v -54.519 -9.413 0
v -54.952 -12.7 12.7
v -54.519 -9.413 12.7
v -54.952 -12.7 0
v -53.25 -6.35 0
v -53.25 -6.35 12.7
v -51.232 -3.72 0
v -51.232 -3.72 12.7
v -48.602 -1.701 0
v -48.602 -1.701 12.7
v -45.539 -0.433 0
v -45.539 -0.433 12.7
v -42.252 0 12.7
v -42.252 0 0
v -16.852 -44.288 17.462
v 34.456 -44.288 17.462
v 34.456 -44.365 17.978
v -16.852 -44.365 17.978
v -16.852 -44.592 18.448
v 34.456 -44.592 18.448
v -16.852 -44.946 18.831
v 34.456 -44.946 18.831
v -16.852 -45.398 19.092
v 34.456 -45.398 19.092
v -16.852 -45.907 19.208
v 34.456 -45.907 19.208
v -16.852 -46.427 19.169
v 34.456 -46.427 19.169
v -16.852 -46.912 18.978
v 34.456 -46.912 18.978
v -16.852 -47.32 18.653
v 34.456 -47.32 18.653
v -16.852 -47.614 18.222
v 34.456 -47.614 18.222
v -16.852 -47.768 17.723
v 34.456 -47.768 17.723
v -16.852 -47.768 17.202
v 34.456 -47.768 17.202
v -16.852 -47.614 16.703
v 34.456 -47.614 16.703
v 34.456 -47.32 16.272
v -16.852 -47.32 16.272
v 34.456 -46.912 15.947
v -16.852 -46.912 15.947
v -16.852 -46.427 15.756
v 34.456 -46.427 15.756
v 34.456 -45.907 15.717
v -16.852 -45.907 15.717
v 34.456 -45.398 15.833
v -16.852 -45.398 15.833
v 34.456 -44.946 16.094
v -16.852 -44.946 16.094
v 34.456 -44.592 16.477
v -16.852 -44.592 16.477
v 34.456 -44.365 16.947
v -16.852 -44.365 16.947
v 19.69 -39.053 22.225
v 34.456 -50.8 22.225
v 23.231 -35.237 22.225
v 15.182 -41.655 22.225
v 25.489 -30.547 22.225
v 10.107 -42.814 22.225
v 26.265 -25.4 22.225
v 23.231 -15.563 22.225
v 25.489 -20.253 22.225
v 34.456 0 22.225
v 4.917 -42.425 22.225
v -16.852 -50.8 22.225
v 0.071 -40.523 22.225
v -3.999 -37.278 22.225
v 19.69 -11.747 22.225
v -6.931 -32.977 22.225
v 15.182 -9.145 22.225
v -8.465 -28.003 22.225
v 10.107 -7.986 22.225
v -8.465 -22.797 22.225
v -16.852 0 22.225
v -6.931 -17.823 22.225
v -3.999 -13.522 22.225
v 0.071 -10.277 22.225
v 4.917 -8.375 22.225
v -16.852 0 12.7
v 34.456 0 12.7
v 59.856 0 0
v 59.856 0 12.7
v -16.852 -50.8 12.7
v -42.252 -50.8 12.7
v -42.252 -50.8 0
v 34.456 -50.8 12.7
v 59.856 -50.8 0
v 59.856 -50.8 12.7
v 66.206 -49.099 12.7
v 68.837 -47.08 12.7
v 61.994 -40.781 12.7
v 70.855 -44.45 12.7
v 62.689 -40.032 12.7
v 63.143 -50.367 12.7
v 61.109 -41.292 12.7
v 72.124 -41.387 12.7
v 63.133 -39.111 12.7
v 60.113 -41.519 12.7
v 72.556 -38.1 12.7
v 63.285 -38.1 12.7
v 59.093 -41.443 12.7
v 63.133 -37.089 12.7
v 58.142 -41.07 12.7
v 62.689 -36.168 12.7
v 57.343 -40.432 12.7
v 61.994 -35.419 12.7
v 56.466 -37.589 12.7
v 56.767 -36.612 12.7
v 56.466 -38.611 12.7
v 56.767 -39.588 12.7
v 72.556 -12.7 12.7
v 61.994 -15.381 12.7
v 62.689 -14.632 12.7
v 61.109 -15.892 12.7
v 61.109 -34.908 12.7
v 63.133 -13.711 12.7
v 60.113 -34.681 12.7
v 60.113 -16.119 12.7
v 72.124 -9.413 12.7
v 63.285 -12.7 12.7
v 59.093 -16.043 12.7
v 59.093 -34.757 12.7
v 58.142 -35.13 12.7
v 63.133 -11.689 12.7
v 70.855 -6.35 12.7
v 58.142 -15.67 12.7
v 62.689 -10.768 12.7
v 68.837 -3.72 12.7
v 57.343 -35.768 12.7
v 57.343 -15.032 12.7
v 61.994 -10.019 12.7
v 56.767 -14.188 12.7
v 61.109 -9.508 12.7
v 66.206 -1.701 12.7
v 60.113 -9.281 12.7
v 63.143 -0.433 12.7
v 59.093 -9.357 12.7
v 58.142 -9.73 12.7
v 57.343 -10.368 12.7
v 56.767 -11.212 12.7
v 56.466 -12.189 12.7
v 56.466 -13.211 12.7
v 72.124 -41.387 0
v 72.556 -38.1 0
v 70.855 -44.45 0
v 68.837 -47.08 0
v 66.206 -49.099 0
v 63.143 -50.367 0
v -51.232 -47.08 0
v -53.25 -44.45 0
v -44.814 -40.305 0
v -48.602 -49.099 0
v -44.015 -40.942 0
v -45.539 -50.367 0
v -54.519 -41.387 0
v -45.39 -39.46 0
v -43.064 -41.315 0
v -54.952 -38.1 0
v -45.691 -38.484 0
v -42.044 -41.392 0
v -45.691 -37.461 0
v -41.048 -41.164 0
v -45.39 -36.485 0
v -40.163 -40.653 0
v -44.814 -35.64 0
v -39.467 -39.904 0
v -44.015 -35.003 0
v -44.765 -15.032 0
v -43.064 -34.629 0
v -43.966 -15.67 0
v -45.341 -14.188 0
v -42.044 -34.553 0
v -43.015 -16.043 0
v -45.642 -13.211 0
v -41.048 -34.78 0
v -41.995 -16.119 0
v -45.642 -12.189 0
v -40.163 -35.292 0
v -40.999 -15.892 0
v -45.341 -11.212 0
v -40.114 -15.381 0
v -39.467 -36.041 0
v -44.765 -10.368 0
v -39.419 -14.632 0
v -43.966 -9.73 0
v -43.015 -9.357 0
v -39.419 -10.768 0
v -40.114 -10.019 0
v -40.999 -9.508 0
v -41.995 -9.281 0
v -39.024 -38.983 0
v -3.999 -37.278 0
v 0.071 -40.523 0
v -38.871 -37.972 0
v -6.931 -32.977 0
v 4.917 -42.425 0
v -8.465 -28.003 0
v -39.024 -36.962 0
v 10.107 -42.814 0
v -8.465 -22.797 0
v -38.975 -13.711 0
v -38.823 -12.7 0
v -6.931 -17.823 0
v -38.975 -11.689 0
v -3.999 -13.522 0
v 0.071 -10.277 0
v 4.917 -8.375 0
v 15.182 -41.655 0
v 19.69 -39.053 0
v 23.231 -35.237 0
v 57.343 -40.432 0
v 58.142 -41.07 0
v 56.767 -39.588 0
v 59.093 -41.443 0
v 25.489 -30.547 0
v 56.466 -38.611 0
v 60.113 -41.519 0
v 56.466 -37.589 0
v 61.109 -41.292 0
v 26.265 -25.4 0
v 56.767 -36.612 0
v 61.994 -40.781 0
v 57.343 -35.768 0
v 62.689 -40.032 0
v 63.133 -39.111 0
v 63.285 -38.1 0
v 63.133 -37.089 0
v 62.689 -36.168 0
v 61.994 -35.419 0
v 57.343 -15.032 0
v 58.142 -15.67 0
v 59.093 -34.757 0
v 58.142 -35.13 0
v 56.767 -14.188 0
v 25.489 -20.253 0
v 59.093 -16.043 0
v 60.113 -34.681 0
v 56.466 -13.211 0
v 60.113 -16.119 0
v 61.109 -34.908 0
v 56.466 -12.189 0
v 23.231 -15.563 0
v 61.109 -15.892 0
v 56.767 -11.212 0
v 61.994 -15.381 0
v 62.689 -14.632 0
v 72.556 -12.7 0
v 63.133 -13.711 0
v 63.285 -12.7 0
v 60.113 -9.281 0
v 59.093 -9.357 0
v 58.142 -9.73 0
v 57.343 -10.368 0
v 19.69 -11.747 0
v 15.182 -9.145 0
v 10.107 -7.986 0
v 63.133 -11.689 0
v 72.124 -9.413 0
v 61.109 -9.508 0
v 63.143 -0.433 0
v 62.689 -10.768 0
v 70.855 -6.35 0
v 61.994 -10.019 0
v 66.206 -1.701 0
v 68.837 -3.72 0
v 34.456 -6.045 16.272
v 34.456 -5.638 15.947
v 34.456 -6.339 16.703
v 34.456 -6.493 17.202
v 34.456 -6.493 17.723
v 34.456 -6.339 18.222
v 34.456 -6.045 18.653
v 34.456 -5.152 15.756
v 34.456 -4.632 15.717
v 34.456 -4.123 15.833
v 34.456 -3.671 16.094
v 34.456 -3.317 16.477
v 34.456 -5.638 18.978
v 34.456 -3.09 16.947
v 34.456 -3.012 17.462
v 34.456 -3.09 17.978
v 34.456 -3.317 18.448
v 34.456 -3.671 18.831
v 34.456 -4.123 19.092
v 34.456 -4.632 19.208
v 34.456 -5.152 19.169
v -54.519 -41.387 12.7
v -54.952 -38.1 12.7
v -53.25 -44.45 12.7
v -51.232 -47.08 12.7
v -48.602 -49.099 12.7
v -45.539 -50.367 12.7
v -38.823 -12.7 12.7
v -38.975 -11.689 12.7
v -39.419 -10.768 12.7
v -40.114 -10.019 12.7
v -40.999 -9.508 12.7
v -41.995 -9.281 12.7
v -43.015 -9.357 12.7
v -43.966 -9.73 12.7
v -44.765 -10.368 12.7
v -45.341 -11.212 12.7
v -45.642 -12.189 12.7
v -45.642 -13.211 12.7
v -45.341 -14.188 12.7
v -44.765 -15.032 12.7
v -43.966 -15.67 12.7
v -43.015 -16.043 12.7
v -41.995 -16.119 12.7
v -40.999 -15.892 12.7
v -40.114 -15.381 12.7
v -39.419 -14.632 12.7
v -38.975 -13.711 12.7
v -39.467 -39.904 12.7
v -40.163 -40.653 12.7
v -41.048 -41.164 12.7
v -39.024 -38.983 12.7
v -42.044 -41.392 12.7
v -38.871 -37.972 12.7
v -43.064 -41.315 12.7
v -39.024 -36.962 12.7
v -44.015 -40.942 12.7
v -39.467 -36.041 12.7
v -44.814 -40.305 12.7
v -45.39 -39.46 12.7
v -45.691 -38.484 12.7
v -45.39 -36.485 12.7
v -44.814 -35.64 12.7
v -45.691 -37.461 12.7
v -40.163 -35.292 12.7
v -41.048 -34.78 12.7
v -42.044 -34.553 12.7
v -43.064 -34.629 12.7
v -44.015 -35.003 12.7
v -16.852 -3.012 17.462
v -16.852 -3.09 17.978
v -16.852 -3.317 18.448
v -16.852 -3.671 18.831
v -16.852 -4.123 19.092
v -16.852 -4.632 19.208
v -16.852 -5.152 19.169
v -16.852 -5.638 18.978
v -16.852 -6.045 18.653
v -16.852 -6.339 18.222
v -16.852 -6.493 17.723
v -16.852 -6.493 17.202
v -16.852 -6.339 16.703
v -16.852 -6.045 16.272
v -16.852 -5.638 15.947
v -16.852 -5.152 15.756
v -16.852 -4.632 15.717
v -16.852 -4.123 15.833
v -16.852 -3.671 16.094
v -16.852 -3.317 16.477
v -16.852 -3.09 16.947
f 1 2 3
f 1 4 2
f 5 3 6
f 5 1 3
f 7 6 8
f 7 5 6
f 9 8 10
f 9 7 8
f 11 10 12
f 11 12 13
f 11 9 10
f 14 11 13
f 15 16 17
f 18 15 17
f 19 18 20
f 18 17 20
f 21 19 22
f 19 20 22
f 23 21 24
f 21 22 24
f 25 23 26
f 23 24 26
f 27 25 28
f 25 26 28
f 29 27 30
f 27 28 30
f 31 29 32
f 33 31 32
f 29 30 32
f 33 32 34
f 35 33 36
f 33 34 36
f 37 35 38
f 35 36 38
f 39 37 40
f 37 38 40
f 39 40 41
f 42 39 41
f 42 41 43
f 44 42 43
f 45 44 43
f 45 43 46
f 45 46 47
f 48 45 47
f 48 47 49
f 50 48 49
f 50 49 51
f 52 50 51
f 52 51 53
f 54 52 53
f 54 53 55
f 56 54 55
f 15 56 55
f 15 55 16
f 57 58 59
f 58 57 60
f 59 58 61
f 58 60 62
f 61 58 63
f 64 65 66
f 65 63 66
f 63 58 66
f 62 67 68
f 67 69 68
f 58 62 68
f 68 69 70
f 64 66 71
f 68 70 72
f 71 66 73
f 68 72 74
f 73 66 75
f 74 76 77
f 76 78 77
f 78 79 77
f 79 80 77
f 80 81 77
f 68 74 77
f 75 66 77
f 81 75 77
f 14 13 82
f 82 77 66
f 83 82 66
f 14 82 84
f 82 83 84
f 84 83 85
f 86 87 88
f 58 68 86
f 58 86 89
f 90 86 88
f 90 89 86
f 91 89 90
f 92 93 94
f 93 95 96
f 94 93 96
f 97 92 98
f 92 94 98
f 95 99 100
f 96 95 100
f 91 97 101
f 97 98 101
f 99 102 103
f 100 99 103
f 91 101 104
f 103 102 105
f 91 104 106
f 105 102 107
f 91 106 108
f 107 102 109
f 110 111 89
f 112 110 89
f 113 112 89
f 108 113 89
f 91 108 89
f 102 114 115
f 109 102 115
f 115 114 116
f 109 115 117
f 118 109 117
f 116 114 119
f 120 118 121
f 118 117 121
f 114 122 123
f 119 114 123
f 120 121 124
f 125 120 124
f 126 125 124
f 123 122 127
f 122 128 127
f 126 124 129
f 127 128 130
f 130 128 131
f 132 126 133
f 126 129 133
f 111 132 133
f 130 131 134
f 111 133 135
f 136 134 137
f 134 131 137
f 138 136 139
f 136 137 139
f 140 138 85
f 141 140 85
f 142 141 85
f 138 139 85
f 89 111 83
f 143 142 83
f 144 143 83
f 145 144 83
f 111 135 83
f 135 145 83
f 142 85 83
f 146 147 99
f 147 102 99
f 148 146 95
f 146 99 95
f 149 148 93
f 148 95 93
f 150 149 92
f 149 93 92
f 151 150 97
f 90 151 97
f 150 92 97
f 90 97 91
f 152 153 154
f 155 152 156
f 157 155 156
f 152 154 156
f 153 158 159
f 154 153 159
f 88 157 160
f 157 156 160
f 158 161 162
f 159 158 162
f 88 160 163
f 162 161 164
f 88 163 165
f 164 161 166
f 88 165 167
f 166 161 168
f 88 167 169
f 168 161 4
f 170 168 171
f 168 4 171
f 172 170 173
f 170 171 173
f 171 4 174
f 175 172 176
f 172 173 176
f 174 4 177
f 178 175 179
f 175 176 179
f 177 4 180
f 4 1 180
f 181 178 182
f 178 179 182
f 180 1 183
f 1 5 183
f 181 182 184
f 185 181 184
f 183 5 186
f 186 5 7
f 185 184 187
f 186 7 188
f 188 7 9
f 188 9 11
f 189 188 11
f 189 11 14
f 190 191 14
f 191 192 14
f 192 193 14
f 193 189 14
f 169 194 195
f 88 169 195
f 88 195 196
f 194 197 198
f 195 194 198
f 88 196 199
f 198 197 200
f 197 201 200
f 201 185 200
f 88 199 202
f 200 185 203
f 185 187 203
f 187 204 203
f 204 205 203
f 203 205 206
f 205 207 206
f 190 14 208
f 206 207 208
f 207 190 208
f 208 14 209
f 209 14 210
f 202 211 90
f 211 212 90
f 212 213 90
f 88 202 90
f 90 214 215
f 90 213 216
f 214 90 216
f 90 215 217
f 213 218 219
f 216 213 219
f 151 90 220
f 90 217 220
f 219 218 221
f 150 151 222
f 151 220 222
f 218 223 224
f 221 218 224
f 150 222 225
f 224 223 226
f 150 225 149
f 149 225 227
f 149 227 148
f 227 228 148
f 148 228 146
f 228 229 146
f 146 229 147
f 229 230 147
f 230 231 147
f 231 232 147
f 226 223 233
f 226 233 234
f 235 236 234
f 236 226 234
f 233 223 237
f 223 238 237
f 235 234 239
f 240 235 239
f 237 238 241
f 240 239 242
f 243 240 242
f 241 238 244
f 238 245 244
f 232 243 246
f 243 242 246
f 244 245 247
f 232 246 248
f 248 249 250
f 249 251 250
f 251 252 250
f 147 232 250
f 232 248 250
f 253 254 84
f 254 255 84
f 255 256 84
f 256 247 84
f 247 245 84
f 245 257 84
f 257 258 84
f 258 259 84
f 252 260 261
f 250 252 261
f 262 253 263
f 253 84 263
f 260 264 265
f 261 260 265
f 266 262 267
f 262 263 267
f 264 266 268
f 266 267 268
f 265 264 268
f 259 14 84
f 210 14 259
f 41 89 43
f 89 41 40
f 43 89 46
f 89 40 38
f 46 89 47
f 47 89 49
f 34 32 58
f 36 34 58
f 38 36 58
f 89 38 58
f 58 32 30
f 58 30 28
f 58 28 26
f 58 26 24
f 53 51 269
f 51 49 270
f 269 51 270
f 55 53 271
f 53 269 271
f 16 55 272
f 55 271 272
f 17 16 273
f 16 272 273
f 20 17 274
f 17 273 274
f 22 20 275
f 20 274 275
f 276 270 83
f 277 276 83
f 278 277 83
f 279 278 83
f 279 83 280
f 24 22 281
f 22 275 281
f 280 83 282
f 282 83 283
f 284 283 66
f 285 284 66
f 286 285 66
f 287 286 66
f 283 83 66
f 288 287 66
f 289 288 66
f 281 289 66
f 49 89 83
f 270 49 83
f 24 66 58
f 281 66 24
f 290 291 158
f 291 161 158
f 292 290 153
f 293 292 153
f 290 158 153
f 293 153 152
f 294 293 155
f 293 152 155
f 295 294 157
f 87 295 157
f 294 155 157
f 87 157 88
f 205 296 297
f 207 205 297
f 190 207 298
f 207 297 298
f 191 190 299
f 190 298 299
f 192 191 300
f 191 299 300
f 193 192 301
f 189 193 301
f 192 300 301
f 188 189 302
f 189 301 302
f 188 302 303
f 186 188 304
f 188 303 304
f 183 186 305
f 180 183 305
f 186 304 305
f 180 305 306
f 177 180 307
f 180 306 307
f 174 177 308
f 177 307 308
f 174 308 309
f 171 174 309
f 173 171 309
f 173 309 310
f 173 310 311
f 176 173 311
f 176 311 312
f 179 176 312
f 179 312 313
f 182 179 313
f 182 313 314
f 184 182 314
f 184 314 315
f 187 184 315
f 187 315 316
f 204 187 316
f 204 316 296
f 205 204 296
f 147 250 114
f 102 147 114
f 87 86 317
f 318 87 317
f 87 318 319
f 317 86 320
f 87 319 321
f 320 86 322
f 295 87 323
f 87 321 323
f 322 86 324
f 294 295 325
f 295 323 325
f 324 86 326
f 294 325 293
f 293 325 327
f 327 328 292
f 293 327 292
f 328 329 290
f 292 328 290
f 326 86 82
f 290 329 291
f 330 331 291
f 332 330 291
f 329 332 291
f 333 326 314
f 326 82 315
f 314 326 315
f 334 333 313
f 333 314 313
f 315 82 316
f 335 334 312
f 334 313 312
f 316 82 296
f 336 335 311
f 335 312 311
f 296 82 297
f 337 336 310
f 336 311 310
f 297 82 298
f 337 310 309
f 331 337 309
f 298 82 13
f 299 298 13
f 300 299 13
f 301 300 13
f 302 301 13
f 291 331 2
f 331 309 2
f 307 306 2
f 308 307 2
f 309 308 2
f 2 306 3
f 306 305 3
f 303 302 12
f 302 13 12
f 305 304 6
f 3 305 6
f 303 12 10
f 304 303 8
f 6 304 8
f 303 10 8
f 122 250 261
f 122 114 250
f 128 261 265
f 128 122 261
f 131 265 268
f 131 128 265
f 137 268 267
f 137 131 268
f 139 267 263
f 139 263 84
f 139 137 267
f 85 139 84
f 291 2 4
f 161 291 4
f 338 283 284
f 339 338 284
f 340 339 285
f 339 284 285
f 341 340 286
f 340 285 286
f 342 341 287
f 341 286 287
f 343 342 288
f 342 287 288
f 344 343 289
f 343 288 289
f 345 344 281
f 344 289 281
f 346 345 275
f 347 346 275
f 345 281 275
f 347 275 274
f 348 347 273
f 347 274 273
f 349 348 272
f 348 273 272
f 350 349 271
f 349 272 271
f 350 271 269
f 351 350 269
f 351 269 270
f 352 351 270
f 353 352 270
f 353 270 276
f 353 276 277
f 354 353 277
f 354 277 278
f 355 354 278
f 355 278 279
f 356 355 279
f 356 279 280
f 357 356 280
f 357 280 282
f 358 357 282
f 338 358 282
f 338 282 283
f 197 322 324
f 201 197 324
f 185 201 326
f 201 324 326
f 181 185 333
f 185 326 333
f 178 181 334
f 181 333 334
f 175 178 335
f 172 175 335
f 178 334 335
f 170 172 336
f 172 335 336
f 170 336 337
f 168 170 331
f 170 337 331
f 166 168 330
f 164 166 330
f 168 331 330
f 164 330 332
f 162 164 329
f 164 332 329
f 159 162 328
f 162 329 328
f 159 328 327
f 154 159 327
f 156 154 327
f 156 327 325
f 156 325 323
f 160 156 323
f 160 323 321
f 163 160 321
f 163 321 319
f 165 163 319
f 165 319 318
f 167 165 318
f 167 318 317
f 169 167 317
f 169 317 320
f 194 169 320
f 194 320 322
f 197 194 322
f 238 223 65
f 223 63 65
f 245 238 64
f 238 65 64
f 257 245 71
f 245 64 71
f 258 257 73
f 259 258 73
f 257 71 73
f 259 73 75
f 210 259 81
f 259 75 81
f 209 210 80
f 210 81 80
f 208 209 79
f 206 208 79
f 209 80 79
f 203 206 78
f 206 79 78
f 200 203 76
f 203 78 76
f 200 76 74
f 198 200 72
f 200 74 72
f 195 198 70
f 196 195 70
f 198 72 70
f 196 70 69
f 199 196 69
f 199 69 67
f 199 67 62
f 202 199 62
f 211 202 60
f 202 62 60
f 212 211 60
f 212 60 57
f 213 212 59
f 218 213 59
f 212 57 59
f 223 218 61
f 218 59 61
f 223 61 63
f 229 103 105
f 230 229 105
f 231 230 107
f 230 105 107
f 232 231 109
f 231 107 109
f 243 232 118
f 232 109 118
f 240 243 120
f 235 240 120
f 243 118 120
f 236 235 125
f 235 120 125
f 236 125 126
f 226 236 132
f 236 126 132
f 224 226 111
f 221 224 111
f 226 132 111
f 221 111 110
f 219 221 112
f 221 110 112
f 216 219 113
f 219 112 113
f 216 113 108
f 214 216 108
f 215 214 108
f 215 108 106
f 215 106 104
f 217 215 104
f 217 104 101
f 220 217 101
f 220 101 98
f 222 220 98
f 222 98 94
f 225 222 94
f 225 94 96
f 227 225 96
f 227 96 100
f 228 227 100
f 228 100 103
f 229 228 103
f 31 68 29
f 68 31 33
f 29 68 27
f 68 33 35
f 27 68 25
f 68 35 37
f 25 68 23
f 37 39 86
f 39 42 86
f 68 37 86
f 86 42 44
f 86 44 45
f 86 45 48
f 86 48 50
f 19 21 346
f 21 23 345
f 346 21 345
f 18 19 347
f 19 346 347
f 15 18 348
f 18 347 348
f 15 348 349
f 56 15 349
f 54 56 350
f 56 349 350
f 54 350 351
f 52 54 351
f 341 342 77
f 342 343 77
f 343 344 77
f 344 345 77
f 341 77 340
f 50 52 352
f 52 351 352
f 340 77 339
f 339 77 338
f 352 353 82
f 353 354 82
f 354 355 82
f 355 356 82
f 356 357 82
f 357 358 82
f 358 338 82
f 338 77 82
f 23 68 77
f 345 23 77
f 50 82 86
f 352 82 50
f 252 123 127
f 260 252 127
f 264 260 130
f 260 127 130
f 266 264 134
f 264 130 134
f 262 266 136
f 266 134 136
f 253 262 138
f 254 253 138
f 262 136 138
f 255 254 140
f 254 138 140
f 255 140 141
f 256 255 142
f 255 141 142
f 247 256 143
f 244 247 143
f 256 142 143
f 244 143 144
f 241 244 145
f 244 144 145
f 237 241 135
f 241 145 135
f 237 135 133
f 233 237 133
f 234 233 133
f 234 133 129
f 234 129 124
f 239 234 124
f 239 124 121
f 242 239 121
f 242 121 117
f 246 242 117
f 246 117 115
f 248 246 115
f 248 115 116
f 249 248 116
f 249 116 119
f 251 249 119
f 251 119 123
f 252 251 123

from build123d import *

# Parameters (mm, degrees)
F1_DEPTH      = 50.8
F2_R          = 12.7
F3_R          = 3.429
F3_R_2        = 17.4625
F4_DEPTH      = 25.4
F4_DEPTH_BACK = 25.4
F5_R          = 1.75
F6_DEPTH      = 89.409


with BuildPart() as f1:
    # F0 (on Front) → F1 (new body)
    with BuildSketch(Plane.XZ):
        Polygon((34.4563108511, 22.225), (-16.8516891489, 22.225), (-16.8516891489, 12.7), (-54.9516891489, 12.7), (-54.9516891489, 0), (72.5563108511, 0), (72.5563108511, 12.7), (34.4563108511, 12.7), align=None)
    extrude(amount=F1_DEPTH)

    # F2
    f2_edges = [f1.edges().sort_by_distance(p)[0] for p in [
        (72.556311, -50.8, 6.35),
        (72.556311, 0, 6.35),
        (-54.951689, -50.8, 6.35),
        (-54.951689, 0, 6.35),
    ]]
    fillet(f2_edges, radius=F2_R)

    # F3 (on face) → F4 (cut, two sides)
    with BuildSketch(Plane.XY.offset(12.7)) as f4_sk:
        with Locations((-42.2516891489, -12.7)):
            Circle(F3_R)
        with Locations((8.8023108511, -25.4)):
            Circle(F3_R_2)
        with Locations((59.8563108511, -38.1)):
            Circle(F3_R)
        with Locations((-42.3004887998, -37.9724390805)):
            Circle(F3_R)
        with Locations((59.8563108511, -12.7)):
            Circle(F3_R)
    extrude(amount=-F4_DEPTH, mode=Mode.SUBTRACT)
    extrude(f4_sk.sketch, amount=F4_DEPTH_BACK, mode=Mode.SUBTRACT)

    # F5 (on face) → F6 (cut, through all)
    with BuildSketch(Plane.YZ.offset(34.4563108511)):
        with Locations((-46.0375, 17.4625)):
            Circle(F5_R)
        with Locations((-4.7625, 17.4625)):
            Circle(F5_R)
    extrude(amount=-F6_DEPTH, mode=Mode.SUBTRACT)


solid = f1.part
